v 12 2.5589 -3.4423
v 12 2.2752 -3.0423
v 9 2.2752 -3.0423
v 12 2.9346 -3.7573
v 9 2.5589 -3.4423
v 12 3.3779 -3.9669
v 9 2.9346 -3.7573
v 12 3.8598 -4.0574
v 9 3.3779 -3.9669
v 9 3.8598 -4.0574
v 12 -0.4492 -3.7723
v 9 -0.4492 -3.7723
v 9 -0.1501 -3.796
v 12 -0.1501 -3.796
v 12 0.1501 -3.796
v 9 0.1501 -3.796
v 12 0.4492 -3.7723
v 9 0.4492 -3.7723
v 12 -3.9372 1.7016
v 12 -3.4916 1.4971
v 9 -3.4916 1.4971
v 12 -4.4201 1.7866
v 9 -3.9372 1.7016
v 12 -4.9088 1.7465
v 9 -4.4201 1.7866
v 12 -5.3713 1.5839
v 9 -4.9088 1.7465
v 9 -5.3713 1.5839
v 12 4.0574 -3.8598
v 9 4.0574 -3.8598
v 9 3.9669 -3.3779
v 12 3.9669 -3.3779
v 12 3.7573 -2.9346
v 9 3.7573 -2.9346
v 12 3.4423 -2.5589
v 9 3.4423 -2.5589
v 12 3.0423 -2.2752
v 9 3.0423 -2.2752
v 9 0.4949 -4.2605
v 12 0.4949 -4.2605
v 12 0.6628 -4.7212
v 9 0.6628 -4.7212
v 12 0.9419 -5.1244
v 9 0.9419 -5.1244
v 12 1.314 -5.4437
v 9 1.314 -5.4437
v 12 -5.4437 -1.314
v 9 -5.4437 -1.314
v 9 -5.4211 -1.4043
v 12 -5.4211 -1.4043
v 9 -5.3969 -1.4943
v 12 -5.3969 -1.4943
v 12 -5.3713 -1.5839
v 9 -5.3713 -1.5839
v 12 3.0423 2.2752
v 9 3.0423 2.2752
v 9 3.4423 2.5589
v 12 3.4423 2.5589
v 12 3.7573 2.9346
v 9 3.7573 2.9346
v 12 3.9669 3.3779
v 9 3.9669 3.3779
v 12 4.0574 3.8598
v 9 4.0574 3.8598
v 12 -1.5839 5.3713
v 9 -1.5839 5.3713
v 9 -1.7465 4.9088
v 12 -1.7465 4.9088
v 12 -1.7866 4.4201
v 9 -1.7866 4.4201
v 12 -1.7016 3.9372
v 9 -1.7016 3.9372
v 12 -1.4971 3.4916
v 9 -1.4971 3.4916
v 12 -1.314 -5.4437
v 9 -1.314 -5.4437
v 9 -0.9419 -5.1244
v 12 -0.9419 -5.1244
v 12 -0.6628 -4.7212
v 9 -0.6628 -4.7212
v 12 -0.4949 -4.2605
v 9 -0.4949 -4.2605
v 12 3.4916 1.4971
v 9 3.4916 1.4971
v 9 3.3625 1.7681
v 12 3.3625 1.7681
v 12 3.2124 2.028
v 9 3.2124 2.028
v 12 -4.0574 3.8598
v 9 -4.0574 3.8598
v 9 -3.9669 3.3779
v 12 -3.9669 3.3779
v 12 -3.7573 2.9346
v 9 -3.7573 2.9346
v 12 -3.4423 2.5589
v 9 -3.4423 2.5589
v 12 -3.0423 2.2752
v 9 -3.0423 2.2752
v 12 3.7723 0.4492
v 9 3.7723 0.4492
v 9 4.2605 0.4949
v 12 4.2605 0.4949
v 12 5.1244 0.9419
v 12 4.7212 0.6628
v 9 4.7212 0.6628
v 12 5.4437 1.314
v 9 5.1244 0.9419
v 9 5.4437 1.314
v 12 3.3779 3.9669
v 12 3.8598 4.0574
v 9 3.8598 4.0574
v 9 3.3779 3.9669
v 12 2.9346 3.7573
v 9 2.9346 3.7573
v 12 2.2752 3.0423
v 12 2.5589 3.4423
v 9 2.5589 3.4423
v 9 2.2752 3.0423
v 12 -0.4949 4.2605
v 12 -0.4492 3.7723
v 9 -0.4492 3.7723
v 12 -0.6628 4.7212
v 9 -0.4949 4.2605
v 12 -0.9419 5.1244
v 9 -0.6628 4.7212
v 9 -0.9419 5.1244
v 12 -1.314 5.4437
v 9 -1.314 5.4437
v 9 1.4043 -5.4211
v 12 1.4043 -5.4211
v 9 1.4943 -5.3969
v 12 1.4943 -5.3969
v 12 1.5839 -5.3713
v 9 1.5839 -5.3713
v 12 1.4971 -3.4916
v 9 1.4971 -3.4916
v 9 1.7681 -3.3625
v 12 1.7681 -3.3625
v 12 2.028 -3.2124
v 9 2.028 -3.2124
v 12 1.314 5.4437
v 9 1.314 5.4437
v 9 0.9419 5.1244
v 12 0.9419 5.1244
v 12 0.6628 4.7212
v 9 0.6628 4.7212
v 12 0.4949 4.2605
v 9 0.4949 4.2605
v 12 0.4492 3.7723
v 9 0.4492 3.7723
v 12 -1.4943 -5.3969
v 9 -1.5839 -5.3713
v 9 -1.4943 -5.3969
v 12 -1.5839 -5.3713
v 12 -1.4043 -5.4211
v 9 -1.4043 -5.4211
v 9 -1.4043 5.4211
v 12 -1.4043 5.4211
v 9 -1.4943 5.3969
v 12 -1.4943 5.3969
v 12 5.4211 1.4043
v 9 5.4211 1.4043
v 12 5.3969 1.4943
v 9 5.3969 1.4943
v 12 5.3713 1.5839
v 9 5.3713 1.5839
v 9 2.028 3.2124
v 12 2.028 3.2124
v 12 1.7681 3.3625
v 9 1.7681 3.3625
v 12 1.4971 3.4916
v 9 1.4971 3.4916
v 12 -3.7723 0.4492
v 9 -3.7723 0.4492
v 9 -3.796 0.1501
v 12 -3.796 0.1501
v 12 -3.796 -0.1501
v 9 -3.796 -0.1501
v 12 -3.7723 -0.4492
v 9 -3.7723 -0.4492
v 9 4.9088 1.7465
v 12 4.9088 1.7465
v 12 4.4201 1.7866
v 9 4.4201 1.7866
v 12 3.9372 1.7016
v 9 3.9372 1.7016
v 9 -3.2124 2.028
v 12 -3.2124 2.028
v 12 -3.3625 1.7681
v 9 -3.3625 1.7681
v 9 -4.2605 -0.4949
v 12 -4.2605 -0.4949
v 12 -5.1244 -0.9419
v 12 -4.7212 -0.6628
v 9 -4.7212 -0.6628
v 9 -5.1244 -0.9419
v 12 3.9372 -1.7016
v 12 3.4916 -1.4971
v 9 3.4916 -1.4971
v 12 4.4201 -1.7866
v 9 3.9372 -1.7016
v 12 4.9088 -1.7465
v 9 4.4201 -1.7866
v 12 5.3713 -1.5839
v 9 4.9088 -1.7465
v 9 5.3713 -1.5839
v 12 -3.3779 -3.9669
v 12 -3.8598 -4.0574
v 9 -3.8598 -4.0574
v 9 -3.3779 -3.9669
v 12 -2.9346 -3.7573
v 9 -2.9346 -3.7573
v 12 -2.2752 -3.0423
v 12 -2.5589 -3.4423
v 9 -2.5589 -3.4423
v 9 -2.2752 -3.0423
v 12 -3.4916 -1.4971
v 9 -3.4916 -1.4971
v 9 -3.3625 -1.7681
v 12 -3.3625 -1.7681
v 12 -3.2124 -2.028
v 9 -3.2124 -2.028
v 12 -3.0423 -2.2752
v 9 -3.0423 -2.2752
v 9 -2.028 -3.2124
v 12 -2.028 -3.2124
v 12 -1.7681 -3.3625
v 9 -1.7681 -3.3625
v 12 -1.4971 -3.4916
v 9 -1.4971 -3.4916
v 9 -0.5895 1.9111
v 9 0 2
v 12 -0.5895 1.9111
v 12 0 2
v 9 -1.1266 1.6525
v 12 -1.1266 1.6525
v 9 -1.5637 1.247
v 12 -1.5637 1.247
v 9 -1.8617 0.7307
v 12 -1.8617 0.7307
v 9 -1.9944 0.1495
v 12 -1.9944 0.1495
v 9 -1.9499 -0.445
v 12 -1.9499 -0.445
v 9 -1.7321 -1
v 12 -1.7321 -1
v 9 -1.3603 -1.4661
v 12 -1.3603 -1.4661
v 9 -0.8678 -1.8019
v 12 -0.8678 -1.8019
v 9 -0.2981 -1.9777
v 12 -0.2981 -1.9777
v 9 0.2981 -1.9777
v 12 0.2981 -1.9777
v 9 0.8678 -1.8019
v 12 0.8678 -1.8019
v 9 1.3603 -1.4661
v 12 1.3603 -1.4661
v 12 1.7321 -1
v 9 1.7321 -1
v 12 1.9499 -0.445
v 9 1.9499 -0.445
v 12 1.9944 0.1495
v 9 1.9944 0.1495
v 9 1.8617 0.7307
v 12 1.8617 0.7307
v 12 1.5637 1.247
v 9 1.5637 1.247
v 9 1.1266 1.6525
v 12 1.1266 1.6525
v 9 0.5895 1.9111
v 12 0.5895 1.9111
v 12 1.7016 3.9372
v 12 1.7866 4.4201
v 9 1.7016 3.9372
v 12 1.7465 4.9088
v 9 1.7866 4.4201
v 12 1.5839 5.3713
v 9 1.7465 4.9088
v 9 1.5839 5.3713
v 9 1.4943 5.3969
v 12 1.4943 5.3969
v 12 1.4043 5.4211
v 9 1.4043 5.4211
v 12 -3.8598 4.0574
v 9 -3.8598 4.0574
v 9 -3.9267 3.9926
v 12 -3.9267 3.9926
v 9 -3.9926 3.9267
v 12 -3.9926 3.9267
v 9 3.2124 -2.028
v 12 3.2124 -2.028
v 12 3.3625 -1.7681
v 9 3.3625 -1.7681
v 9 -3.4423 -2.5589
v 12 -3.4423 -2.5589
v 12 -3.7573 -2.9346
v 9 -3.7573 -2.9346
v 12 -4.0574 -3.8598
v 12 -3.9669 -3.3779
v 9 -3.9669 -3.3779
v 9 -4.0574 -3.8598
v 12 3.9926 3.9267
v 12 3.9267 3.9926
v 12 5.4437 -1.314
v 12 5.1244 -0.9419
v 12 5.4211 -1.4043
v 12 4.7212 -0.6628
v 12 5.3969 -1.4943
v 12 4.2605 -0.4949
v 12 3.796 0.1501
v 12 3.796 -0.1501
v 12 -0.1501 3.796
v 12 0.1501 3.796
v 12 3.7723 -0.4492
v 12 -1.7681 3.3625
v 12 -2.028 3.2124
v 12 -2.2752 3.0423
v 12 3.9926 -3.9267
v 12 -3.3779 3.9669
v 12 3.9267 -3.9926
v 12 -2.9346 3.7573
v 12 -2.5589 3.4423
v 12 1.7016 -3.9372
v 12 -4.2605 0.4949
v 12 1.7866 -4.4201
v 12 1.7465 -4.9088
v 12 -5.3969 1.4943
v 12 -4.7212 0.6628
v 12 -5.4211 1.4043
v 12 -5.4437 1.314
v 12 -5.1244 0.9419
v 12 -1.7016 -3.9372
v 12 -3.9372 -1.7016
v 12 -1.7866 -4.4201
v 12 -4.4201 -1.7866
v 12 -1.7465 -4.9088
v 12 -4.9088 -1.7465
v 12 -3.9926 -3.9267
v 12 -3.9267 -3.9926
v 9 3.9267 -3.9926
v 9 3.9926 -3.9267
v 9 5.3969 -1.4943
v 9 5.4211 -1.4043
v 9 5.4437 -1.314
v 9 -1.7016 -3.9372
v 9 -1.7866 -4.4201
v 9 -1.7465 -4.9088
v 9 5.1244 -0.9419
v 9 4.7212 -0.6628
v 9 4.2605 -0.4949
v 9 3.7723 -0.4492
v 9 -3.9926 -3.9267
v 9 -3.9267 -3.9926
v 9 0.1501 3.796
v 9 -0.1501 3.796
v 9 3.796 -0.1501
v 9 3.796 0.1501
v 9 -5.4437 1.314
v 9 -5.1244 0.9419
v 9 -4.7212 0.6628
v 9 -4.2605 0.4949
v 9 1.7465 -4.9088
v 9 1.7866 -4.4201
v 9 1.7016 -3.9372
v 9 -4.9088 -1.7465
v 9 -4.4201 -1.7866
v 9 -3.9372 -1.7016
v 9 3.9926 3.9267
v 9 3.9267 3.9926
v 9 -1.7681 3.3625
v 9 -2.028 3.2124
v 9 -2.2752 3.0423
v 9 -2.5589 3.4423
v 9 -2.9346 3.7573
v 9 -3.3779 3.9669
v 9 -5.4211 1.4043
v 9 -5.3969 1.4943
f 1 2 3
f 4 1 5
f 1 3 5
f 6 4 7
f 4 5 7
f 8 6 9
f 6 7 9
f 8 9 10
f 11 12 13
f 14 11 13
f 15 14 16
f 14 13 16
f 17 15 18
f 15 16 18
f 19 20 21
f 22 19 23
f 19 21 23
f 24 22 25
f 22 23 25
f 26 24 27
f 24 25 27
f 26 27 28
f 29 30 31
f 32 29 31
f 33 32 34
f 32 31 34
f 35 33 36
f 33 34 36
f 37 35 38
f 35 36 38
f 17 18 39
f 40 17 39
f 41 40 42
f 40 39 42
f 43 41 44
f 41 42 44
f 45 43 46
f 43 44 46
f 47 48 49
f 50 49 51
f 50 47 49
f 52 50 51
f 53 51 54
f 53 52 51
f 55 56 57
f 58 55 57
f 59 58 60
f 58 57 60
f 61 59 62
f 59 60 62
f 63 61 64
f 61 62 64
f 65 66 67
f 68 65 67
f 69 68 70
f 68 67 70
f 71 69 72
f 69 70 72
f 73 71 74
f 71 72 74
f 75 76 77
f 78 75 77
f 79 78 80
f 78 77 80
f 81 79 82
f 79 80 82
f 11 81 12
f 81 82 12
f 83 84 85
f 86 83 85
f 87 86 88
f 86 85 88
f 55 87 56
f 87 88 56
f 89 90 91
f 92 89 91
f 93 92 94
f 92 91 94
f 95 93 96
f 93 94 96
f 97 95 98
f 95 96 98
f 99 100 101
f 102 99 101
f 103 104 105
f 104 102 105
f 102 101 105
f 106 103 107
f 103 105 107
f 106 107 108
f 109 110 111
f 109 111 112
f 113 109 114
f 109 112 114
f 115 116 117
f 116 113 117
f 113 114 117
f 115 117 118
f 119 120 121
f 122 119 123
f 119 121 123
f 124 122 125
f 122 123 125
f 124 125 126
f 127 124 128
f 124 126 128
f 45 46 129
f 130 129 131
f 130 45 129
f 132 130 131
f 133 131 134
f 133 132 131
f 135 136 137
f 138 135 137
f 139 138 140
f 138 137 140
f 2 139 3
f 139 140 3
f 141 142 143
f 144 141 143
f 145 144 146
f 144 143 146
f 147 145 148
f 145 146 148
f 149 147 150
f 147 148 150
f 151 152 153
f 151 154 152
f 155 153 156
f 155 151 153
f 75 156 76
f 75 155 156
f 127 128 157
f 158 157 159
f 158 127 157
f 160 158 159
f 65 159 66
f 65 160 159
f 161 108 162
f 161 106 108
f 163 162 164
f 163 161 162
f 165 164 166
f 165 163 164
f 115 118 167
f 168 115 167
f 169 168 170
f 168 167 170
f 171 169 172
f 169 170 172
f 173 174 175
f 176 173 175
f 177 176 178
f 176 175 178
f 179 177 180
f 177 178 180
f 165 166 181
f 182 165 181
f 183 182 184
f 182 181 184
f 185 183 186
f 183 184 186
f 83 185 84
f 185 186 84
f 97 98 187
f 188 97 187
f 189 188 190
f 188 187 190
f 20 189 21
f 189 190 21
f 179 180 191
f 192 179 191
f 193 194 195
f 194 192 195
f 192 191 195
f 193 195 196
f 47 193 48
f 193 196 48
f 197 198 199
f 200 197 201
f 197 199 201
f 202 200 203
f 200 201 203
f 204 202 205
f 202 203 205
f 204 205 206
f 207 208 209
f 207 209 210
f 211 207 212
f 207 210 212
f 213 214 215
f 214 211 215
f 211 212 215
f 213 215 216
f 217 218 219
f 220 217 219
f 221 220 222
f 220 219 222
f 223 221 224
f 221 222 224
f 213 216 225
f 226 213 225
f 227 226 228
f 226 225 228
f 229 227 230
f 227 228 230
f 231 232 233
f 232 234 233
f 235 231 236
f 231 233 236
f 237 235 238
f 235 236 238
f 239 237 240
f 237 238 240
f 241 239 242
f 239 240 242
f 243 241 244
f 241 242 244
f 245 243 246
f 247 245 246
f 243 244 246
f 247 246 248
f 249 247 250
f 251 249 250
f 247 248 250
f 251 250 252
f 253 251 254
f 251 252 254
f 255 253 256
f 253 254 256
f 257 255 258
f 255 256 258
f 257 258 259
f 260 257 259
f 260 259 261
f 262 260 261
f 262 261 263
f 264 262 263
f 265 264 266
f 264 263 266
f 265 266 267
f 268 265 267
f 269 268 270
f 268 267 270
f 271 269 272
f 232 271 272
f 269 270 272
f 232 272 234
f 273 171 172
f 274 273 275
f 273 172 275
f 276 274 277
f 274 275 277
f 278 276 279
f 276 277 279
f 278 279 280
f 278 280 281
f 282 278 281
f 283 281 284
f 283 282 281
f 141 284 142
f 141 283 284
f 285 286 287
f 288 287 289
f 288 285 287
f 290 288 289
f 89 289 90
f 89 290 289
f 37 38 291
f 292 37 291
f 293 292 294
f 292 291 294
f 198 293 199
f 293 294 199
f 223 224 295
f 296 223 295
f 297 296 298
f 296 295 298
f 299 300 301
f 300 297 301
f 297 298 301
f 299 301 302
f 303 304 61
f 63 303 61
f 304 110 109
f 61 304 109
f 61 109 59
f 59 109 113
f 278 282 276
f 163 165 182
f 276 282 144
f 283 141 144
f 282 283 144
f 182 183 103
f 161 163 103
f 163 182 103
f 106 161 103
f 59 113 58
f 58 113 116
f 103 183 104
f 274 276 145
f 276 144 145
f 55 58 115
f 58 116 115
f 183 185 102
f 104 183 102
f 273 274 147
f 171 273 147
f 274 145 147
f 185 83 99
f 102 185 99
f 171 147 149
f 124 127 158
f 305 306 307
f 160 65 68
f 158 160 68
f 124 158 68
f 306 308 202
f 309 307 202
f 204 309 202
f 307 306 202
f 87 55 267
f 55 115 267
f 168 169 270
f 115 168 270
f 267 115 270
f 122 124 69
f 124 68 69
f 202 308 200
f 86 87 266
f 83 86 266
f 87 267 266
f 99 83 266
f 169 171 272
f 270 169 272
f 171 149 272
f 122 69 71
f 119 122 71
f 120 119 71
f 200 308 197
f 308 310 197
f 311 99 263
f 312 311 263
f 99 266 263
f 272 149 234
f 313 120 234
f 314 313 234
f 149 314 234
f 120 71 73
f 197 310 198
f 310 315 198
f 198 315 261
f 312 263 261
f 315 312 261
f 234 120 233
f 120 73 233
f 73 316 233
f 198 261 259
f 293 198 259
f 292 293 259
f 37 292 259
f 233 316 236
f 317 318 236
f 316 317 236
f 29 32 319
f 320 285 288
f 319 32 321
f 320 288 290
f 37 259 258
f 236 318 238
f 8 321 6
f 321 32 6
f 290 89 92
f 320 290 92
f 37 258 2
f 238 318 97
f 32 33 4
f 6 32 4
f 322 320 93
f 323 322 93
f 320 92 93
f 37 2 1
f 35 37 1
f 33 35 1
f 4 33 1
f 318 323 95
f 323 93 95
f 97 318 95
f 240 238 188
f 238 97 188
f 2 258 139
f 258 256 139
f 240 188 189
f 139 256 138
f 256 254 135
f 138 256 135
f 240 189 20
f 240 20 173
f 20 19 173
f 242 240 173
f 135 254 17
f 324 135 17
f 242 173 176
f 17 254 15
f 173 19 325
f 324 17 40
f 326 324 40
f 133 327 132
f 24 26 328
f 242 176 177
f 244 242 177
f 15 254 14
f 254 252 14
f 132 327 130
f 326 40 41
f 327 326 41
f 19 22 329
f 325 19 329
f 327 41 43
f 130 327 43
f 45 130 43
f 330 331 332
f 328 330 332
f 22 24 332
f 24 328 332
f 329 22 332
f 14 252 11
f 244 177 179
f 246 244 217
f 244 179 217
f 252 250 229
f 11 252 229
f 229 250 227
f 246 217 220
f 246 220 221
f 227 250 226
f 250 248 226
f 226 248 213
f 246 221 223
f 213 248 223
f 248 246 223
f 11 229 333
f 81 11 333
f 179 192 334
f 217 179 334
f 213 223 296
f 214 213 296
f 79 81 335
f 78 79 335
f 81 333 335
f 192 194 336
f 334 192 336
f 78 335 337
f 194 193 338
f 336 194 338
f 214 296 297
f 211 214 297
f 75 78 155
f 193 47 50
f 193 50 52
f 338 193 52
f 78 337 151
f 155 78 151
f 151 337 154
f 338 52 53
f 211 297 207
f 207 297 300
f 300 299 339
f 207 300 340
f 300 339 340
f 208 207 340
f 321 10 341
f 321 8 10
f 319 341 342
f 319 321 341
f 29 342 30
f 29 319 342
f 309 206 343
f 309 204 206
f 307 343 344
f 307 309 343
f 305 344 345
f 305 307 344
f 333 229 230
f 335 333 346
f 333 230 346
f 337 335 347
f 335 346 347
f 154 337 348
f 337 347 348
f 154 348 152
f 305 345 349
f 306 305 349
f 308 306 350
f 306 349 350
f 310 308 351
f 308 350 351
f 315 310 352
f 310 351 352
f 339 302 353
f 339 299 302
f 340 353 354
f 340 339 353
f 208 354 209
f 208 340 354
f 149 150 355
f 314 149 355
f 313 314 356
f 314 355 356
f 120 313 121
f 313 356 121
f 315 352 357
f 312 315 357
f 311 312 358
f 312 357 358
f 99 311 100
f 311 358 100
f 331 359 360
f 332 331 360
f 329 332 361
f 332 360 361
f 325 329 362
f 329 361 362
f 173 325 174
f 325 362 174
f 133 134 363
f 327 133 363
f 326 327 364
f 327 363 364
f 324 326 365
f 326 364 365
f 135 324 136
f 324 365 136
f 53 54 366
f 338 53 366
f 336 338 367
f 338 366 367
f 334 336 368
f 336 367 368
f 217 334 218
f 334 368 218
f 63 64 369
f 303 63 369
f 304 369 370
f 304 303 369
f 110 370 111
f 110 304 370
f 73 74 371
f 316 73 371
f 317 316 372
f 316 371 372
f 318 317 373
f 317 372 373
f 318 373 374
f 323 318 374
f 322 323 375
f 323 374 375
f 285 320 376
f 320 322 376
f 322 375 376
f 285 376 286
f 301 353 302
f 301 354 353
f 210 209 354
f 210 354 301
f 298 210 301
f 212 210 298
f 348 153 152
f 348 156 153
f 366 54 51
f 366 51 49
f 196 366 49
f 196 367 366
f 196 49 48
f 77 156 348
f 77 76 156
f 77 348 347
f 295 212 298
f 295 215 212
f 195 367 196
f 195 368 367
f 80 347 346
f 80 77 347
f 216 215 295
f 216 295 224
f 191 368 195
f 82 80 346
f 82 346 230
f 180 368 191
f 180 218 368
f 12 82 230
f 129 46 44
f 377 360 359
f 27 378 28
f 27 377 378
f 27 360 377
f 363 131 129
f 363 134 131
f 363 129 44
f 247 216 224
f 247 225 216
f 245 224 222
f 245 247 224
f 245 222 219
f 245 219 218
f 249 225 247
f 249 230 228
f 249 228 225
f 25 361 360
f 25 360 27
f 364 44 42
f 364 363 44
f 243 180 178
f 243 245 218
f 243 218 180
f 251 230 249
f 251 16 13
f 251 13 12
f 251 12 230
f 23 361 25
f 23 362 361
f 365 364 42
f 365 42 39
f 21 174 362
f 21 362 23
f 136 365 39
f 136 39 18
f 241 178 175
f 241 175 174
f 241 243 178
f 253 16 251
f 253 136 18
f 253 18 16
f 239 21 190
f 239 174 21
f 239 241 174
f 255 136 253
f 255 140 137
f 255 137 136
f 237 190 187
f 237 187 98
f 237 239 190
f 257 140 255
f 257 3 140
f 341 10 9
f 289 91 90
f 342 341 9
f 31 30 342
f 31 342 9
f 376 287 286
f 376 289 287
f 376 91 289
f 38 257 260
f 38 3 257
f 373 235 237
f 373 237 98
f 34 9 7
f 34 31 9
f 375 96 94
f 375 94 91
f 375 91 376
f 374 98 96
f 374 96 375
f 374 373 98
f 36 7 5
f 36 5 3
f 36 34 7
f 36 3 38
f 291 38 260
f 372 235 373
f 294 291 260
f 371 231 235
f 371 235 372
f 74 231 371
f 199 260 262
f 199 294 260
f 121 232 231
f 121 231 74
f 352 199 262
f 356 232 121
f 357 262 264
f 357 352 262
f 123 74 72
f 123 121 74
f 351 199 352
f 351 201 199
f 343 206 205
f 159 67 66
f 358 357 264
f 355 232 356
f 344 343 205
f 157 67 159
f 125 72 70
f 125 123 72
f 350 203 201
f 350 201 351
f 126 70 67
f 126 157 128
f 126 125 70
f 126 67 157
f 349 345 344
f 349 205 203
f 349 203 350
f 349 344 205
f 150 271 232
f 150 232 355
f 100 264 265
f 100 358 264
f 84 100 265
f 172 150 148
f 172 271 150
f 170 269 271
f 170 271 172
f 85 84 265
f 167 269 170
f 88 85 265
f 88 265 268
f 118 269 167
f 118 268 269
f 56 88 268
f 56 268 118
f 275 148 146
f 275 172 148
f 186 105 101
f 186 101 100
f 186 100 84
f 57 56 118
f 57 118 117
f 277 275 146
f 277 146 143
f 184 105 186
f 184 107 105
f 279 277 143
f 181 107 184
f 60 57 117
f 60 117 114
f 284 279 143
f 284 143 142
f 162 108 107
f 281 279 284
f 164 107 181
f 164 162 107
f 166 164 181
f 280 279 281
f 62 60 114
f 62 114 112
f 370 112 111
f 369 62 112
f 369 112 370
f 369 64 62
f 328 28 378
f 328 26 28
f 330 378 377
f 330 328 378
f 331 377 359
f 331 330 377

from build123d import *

# Parameters (mm, degrees)
BASPROSKE_W           = 12
BASPROSKE_H           = 5.6
TOOTHCUT_DEPTH        = 15.377760604
TEETHCUTS_COUNT       = 12
TEETHCUTS_ANGLE       = 330
BORSKE_R              = 2
BORE_DEPTH            = 50.0000508
CROQUIS1_W            = 12.415647279
CROQUIS1_H            = 11.755240509
CORTAR_EXTRUIR1_DEPTH = 9


with BuildPart() as part:
    # BasProSke → Base-Revolve (revolve)
    with BuildSketch(Plane(origin=(0, 0, 0), x_dir=(1, 0, 0), z_dir=(0, 1, 0)), mode=Mode.PRIVATE) as base_revolve_sk:
        with Locations((6, 2.8)):
            Rectangle(BASPROSKE_W, BASPROSKE_H)
    revolve(base_revolve_sk.sketch.rotate(Axis((-10, 0, 0), (1, 0, 0)), 180), axis=Axis((-10, 0, 0), (1, 0, 0)))

    # TooCutSke → ToothCut (cut, through all)
    with BuildSketch(Plane(origin=(0, 0, 0), x_dir=(0, 0, -1), z_dir=(1, 0, 0))):
        with BuildLine():
            ThreePointArc((0.449218713, 3.77234722), (0, 3.799), (-0.449218713, 3.77234722))
            ThreePointArc((-0.449218713, 3.77234722), (-0.670924606, 4.73673149), (-1.343429094, 5.462629717))
            ThreePointArc((-1.343429094, 5.462629717), (0, 5.6254), (1.343429094, 5.462629717))
            ThreePointArc((1.343429094, 5.462629717), (0.670924606, 4.73673149), (0.449218713, 3.77234722))
        make_face()
    toothcut = extrude(amount=TOOTHCUT_DEPTH, mode=Mode.SUBTRACT)

    # TeethCuts: ToothCut ×12 about axis
    teethcuts_axis = Axis((-10, 0, 0), (1, 0, 0))
    for i in range(1, TEETHCUTS_COUNT):
        add(toothcut.rotate(teethcuts_axis, i * TEETHCUTS_ANGLE / (TEETHCUTS_COUNT - 1)), mode=Mode.SUBTRACT)

    # BorSke → Bore (cut, symmetric)
    with BuildSketch(Plane(origin=(0, 0, 0), x_dir=(0, 0, -1), z_dir=(1, 0, 0))):
        with Locations(Location((0, 0, 0), (0, 0, 180))):
            Circle(BORSKE_R)
    extrude(amount=BORE_DEPTH, both=True, mode=Mode.SUBTRACT)

    # Croquis1 → Cortar-Extruir1 (cut)
    with BuildSketch(Plane.ZY):
        with Locations((0.242149149, 0.154094914)):
            Rectangle(CROQUIS1_W, CROQUIS1_H)
    extrude(amount=-CORTAR_EXTRUIR1_DEPTH, mode=Mode.SUBTRACT)


solid = part.part
